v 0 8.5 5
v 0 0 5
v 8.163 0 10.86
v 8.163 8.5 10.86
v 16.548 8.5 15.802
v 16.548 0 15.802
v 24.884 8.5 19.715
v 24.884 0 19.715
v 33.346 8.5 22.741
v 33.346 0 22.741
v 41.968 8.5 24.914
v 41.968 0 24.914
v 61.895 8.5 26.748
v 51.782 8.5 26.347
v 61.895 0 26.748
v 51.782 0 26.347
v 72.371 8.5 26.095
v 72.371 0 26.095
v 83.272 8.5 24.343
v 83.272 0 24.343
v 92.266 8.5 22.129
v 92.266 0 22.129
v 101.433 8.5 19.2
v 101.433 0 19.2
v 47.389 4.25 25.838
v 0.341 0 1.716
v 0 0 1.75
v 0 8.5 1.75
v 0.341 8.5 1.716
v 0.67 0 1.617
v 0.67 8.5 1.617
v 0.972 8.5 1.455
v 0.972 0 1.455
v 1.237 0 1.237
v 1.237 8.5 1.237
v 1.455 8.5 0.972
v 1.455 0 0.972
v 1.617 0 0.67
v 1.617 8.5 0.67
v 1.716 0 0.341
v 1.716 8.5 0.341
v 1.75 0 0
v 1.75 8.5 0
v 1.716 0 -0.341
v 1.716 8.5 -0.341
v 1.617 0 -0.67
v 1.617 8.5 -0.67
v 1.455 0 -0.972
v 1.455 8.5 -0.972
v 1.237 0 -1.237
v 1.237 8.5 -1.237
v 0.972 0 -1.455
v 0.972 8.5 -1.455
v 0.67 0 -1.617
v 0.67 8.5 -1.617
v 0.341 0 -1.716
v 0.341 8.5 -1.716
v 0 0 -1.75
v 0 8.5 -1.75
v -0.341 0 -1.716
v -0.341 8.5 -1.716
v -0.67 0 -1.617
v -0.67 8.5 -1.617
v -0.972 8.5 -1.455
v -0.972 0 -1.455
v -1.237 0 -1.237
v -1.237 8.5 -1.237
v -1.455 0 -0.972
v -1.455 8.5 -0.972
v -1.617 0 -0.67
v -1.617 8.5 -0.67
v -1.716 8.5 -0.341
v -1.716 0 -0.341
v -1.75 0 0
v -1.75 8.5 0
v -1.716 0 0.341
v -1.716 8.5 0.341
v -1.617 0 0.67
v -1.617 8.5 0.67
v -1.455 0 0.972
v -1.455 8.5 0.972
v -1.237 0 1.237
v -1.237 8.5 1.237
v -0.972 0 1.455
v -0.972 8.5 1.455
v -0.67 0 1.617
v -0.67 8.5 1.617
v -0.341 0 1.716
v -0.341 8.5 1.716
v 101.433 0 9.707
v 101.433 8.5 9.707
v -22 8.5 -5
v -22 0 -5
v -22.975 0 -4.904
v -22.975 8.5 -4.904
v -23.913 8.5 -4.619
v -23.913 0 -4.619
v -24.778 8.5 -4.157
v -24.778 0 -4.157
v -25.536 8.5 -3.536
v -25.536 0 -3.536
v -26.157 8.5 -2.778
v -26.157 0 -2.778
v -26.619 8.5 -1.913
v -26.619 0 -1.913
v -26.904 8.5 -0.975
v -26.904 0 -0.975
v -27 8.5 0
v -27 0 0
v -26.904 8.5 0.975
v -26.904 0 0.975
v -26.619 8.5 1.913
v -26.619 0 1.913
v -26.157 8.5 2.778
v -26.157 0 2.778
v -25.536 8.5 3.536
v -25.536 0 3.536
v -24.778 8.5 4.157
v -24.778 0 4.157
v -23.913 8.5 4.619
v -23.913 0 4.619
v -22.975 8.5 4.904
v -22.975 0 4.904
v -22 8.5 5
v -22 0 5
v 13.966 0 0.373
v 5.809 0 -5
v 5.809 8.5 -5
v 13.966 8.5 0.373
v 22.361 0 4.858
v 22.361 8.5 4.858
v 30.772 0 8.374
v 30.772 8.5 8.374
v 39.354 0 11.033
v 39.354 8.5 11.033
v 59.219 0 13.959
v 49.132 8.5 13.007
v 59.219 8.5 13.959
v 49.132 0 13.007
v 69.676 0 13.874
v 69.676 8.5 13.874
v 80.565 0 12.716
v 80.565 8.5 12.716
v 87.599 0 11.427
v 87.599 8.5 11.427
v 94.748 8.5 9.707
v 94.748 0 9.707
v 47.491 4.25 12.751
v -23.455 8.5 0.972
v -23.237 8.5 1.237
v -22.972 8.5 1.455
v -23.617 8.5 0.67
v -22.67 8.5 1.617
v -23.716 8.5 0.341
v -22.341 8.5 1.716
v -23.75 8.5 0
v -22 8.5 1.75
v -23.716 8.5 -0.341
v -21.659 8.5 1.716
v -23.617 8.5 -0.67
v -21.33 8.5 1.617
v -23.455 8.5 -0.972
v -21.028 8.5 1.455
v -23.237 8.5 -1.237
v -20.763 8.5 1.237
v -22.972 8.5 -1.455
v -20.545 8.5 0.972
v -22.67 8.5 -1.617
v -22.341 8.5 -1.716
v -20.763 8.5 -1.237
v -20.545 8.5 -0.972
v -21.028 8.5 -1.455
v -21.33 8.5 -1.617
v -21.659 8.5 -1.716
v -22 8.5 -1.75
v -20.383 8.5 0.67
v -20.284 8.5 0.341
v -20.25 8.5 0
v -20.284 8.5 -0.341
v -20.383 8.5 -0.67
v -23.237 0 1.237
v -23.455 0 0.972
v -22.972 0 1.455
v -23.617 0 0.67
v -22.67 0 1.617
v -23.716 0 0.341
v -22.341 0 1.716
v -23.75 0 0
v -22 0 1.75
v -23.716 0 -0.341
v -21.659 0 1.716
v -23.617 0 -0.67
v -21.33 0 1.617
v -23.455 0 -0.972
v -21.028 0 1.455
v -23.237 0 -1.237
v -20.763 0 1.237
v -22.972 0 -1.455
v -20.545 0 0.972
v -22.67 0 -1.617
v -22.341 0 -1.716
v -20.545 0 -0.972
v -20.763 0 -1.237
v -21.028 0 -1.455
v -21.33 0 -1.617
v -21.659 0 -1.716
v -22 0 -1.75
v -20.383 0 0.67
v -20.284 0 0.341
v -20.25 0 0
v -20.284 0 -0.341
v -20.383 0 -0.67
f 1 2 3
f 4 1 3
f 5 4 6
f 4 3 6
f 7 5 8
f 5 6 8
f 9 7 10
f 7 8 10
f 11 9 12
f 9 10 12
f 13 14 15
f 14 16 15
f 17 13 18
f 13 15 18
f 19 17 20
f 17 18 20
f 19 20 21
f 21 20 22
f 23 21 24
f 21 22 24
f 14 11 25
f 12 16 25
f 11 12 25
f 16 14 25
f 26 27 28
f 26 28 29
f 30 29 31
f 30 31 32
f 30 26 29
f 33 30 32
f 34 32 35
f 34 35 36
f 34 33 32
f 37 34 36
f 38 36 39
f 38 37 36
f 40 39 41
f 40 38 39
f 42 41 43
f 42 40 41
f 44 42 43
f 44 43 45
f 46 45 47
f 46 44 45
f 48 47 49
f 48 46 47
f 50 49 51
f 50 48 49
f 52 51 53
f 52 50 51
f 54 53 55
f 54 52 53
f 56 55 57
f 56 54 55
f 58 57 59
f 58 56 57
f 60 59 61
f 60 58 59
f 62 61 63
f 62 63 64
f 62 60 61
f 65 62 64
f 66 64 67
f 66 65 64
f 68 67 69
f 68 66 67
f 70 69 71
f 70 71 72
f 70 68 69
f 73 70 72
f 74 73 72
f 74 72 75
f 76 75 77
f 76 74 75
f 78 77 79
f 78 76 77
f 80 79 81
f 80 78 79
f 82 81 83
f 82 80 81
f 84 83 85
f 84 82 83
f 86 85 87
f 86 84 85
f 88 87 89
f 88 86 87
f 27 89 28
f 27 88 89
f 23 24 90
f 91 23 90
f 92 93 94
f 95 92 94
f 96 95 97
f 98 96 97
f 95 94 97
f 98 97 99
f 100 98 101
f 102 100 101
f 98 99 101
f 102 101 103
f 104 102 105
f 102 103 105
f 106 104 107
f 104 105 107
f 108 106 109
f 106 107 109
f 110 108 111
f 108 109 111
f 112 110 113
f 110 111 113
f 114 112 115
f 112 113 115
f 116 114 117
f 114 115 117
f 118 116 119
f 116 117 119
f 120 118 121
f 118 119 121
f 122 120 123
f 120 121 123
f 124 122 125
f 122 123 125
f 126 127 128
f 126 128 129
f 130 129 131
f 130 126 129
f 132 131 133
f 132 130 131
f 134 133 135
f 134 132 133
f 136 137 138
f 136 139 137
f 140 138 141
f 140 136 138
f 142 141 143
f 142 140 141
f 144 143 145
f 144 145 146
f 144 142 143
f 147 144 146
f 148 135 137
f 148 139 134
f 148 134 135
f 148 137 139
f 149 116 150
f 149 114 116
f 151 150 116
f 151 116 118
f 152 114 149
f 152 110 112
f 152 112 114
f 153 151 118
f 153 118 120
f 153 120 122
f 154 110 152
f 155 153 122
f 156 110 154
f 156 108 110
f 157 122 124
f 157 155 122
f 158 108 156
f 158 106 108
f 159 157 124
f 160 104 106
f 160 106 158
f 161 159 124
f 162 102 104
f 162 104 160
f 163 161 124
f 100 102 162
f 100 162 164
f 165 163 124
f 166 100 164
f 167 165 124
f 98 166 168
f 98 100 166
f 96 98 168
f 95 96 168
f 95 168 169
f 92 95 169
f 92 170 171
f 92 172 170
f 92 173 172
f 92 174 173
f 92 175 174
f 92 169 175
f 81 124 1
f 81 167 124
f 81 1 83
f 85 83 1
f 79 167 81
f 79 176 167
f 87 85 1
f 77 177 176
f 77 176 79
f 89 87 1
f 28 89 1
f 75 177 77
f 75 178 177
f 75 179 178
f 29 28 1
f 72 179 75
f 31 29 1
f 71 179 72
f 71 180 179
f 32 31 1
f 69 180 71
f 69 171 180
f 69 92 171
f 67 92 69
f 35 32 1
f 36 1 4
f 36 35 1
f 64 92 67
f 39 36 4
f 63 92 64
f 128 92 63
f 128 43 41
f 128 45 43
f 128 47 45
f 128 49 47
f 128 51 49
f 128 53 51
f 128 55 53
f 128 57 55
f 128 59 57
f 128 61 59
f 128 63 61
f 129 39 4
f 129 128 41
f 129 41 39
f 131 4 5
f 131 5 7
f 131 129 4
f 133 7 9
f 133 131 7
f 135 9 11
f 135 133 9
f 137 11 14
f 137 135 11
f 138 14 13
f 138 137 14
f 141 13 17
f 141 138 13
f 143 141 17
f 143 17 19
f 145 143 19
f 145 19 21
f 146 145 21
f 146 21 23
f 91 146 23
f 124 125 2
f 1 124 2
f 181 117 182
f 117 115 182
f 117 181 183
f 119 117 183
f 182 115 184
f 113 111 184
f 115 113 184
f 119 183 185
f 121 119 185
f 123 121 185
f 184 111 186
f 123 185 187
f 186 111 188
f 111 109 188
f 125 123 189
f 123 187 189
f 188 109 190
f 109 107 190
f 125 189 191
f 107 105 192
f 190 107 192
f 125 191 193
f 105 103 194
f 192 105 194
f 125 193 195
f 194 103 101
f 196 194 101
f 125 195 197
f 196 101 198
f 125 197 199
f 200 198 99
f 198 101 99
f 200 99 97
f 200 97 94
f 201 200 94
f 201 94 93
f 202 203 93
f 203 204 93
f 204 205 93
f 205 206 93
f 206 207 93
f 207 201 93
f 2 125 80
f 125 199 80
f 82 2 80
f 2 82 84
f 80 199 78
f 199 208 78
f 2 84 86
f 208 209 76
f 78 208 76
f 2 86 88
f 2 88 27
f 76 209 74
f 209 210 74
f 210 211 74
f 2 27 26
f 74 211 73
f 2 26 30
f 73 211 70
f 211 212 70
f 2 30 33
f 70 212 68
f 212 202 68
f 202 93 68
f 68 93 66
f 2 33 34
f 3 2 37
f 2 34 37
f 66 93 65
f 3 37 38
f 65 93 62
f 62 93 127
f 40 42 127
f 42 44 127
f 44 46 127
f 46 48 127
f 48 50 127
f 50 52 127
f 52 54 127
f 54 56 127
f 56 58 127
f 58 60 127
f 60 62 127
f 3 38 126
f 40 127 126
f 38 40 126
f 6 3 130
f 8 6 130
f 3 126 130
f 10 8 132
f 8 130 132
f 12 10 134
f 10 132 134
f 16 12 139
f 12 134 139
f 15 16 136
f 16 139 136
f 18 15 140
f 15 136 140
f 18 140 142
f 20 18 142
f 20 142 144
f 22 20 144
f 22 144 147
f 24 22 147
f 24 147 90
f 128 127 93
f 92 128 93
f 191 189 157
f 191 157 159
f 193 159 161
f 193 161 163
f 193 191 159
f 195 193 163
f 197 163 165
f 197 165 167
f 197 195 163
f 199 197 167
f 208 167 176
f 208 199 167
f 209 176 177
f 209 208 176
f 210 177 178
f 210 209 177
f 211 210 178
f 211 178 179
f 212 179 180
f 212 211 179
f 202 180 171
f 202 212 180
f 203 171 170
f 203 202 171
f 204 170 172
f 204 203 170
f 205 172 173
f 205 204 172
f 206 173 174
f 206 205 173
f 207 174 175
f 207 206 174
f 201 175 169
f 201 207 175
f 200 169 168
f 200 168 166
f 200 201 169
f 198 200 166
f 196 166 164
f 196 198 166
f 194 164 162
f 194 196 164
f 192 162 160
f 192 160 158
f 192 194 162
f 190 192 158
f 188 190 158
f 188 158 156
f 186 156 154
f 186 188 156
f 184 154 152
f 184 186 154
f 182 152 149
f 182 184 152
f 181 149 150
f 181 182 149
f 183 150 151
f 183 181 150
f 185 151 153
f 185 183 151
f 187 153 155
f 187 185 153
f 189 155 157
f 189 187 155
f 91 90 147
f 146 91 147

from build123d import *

# Parameters (mm, degrees)
CROQUIS2_R              = 1.75
SALIENTE_EXTRUIR1_DEPTH = 8.5


with BuildPart() as part:
    # Croquis2 → Saliente-Extruir1 (new body)
    with BuildSketch(Plane(origin=(0, 0, 0), x_dir=(1, 0, 0), z_dir=(0, 1, 0))):
        with BuildLine():
            Line((-22, -5), (0, -5))
            add(Edge.make_bspline(
                [(0, -5), (44.060717463, -39.575226666), (101.432631882, -19.199942723)],
                knots=[0, 0, 0, 1, 1, 1], degree=2))
            Line((101.432631882, -19.199942723), (101.432631882, -9.706723131))
            Line((101.432631882, -9.706723131), (94.748347294, -9.706723131))
            add(Edge.make_bspline(
                [(5.809010248, 5), (44.703591594, -23.148227448), (94.748347294, -9.706723131)],
                knots=[0, 0, 0, 1, 1, 1], degree=2))
            Line((5.809010248, 5), (0, 5))
            Line((0, 5), (-0.763110027, 5))
            Line((-0.763110027, 5), (-22, 5))
            ThreePointArc((-22, 5), (-27, 0), (-22, -5))
        make_face()
        with Locations(Location((-22, 0, 0), (0, 0, 270))):
            Circle(CROQUIS2_R, mode=Mode.SUBTRACT)
        with Locations(Location((0, 0, 0), (0, 0, 270))):
            Circle(CROQUIS2_R, mode=Mode.SUBTRACT)
    extrude(amount=SALIENTE_EXTRUIR1_DEPTH)


solid = part.part
